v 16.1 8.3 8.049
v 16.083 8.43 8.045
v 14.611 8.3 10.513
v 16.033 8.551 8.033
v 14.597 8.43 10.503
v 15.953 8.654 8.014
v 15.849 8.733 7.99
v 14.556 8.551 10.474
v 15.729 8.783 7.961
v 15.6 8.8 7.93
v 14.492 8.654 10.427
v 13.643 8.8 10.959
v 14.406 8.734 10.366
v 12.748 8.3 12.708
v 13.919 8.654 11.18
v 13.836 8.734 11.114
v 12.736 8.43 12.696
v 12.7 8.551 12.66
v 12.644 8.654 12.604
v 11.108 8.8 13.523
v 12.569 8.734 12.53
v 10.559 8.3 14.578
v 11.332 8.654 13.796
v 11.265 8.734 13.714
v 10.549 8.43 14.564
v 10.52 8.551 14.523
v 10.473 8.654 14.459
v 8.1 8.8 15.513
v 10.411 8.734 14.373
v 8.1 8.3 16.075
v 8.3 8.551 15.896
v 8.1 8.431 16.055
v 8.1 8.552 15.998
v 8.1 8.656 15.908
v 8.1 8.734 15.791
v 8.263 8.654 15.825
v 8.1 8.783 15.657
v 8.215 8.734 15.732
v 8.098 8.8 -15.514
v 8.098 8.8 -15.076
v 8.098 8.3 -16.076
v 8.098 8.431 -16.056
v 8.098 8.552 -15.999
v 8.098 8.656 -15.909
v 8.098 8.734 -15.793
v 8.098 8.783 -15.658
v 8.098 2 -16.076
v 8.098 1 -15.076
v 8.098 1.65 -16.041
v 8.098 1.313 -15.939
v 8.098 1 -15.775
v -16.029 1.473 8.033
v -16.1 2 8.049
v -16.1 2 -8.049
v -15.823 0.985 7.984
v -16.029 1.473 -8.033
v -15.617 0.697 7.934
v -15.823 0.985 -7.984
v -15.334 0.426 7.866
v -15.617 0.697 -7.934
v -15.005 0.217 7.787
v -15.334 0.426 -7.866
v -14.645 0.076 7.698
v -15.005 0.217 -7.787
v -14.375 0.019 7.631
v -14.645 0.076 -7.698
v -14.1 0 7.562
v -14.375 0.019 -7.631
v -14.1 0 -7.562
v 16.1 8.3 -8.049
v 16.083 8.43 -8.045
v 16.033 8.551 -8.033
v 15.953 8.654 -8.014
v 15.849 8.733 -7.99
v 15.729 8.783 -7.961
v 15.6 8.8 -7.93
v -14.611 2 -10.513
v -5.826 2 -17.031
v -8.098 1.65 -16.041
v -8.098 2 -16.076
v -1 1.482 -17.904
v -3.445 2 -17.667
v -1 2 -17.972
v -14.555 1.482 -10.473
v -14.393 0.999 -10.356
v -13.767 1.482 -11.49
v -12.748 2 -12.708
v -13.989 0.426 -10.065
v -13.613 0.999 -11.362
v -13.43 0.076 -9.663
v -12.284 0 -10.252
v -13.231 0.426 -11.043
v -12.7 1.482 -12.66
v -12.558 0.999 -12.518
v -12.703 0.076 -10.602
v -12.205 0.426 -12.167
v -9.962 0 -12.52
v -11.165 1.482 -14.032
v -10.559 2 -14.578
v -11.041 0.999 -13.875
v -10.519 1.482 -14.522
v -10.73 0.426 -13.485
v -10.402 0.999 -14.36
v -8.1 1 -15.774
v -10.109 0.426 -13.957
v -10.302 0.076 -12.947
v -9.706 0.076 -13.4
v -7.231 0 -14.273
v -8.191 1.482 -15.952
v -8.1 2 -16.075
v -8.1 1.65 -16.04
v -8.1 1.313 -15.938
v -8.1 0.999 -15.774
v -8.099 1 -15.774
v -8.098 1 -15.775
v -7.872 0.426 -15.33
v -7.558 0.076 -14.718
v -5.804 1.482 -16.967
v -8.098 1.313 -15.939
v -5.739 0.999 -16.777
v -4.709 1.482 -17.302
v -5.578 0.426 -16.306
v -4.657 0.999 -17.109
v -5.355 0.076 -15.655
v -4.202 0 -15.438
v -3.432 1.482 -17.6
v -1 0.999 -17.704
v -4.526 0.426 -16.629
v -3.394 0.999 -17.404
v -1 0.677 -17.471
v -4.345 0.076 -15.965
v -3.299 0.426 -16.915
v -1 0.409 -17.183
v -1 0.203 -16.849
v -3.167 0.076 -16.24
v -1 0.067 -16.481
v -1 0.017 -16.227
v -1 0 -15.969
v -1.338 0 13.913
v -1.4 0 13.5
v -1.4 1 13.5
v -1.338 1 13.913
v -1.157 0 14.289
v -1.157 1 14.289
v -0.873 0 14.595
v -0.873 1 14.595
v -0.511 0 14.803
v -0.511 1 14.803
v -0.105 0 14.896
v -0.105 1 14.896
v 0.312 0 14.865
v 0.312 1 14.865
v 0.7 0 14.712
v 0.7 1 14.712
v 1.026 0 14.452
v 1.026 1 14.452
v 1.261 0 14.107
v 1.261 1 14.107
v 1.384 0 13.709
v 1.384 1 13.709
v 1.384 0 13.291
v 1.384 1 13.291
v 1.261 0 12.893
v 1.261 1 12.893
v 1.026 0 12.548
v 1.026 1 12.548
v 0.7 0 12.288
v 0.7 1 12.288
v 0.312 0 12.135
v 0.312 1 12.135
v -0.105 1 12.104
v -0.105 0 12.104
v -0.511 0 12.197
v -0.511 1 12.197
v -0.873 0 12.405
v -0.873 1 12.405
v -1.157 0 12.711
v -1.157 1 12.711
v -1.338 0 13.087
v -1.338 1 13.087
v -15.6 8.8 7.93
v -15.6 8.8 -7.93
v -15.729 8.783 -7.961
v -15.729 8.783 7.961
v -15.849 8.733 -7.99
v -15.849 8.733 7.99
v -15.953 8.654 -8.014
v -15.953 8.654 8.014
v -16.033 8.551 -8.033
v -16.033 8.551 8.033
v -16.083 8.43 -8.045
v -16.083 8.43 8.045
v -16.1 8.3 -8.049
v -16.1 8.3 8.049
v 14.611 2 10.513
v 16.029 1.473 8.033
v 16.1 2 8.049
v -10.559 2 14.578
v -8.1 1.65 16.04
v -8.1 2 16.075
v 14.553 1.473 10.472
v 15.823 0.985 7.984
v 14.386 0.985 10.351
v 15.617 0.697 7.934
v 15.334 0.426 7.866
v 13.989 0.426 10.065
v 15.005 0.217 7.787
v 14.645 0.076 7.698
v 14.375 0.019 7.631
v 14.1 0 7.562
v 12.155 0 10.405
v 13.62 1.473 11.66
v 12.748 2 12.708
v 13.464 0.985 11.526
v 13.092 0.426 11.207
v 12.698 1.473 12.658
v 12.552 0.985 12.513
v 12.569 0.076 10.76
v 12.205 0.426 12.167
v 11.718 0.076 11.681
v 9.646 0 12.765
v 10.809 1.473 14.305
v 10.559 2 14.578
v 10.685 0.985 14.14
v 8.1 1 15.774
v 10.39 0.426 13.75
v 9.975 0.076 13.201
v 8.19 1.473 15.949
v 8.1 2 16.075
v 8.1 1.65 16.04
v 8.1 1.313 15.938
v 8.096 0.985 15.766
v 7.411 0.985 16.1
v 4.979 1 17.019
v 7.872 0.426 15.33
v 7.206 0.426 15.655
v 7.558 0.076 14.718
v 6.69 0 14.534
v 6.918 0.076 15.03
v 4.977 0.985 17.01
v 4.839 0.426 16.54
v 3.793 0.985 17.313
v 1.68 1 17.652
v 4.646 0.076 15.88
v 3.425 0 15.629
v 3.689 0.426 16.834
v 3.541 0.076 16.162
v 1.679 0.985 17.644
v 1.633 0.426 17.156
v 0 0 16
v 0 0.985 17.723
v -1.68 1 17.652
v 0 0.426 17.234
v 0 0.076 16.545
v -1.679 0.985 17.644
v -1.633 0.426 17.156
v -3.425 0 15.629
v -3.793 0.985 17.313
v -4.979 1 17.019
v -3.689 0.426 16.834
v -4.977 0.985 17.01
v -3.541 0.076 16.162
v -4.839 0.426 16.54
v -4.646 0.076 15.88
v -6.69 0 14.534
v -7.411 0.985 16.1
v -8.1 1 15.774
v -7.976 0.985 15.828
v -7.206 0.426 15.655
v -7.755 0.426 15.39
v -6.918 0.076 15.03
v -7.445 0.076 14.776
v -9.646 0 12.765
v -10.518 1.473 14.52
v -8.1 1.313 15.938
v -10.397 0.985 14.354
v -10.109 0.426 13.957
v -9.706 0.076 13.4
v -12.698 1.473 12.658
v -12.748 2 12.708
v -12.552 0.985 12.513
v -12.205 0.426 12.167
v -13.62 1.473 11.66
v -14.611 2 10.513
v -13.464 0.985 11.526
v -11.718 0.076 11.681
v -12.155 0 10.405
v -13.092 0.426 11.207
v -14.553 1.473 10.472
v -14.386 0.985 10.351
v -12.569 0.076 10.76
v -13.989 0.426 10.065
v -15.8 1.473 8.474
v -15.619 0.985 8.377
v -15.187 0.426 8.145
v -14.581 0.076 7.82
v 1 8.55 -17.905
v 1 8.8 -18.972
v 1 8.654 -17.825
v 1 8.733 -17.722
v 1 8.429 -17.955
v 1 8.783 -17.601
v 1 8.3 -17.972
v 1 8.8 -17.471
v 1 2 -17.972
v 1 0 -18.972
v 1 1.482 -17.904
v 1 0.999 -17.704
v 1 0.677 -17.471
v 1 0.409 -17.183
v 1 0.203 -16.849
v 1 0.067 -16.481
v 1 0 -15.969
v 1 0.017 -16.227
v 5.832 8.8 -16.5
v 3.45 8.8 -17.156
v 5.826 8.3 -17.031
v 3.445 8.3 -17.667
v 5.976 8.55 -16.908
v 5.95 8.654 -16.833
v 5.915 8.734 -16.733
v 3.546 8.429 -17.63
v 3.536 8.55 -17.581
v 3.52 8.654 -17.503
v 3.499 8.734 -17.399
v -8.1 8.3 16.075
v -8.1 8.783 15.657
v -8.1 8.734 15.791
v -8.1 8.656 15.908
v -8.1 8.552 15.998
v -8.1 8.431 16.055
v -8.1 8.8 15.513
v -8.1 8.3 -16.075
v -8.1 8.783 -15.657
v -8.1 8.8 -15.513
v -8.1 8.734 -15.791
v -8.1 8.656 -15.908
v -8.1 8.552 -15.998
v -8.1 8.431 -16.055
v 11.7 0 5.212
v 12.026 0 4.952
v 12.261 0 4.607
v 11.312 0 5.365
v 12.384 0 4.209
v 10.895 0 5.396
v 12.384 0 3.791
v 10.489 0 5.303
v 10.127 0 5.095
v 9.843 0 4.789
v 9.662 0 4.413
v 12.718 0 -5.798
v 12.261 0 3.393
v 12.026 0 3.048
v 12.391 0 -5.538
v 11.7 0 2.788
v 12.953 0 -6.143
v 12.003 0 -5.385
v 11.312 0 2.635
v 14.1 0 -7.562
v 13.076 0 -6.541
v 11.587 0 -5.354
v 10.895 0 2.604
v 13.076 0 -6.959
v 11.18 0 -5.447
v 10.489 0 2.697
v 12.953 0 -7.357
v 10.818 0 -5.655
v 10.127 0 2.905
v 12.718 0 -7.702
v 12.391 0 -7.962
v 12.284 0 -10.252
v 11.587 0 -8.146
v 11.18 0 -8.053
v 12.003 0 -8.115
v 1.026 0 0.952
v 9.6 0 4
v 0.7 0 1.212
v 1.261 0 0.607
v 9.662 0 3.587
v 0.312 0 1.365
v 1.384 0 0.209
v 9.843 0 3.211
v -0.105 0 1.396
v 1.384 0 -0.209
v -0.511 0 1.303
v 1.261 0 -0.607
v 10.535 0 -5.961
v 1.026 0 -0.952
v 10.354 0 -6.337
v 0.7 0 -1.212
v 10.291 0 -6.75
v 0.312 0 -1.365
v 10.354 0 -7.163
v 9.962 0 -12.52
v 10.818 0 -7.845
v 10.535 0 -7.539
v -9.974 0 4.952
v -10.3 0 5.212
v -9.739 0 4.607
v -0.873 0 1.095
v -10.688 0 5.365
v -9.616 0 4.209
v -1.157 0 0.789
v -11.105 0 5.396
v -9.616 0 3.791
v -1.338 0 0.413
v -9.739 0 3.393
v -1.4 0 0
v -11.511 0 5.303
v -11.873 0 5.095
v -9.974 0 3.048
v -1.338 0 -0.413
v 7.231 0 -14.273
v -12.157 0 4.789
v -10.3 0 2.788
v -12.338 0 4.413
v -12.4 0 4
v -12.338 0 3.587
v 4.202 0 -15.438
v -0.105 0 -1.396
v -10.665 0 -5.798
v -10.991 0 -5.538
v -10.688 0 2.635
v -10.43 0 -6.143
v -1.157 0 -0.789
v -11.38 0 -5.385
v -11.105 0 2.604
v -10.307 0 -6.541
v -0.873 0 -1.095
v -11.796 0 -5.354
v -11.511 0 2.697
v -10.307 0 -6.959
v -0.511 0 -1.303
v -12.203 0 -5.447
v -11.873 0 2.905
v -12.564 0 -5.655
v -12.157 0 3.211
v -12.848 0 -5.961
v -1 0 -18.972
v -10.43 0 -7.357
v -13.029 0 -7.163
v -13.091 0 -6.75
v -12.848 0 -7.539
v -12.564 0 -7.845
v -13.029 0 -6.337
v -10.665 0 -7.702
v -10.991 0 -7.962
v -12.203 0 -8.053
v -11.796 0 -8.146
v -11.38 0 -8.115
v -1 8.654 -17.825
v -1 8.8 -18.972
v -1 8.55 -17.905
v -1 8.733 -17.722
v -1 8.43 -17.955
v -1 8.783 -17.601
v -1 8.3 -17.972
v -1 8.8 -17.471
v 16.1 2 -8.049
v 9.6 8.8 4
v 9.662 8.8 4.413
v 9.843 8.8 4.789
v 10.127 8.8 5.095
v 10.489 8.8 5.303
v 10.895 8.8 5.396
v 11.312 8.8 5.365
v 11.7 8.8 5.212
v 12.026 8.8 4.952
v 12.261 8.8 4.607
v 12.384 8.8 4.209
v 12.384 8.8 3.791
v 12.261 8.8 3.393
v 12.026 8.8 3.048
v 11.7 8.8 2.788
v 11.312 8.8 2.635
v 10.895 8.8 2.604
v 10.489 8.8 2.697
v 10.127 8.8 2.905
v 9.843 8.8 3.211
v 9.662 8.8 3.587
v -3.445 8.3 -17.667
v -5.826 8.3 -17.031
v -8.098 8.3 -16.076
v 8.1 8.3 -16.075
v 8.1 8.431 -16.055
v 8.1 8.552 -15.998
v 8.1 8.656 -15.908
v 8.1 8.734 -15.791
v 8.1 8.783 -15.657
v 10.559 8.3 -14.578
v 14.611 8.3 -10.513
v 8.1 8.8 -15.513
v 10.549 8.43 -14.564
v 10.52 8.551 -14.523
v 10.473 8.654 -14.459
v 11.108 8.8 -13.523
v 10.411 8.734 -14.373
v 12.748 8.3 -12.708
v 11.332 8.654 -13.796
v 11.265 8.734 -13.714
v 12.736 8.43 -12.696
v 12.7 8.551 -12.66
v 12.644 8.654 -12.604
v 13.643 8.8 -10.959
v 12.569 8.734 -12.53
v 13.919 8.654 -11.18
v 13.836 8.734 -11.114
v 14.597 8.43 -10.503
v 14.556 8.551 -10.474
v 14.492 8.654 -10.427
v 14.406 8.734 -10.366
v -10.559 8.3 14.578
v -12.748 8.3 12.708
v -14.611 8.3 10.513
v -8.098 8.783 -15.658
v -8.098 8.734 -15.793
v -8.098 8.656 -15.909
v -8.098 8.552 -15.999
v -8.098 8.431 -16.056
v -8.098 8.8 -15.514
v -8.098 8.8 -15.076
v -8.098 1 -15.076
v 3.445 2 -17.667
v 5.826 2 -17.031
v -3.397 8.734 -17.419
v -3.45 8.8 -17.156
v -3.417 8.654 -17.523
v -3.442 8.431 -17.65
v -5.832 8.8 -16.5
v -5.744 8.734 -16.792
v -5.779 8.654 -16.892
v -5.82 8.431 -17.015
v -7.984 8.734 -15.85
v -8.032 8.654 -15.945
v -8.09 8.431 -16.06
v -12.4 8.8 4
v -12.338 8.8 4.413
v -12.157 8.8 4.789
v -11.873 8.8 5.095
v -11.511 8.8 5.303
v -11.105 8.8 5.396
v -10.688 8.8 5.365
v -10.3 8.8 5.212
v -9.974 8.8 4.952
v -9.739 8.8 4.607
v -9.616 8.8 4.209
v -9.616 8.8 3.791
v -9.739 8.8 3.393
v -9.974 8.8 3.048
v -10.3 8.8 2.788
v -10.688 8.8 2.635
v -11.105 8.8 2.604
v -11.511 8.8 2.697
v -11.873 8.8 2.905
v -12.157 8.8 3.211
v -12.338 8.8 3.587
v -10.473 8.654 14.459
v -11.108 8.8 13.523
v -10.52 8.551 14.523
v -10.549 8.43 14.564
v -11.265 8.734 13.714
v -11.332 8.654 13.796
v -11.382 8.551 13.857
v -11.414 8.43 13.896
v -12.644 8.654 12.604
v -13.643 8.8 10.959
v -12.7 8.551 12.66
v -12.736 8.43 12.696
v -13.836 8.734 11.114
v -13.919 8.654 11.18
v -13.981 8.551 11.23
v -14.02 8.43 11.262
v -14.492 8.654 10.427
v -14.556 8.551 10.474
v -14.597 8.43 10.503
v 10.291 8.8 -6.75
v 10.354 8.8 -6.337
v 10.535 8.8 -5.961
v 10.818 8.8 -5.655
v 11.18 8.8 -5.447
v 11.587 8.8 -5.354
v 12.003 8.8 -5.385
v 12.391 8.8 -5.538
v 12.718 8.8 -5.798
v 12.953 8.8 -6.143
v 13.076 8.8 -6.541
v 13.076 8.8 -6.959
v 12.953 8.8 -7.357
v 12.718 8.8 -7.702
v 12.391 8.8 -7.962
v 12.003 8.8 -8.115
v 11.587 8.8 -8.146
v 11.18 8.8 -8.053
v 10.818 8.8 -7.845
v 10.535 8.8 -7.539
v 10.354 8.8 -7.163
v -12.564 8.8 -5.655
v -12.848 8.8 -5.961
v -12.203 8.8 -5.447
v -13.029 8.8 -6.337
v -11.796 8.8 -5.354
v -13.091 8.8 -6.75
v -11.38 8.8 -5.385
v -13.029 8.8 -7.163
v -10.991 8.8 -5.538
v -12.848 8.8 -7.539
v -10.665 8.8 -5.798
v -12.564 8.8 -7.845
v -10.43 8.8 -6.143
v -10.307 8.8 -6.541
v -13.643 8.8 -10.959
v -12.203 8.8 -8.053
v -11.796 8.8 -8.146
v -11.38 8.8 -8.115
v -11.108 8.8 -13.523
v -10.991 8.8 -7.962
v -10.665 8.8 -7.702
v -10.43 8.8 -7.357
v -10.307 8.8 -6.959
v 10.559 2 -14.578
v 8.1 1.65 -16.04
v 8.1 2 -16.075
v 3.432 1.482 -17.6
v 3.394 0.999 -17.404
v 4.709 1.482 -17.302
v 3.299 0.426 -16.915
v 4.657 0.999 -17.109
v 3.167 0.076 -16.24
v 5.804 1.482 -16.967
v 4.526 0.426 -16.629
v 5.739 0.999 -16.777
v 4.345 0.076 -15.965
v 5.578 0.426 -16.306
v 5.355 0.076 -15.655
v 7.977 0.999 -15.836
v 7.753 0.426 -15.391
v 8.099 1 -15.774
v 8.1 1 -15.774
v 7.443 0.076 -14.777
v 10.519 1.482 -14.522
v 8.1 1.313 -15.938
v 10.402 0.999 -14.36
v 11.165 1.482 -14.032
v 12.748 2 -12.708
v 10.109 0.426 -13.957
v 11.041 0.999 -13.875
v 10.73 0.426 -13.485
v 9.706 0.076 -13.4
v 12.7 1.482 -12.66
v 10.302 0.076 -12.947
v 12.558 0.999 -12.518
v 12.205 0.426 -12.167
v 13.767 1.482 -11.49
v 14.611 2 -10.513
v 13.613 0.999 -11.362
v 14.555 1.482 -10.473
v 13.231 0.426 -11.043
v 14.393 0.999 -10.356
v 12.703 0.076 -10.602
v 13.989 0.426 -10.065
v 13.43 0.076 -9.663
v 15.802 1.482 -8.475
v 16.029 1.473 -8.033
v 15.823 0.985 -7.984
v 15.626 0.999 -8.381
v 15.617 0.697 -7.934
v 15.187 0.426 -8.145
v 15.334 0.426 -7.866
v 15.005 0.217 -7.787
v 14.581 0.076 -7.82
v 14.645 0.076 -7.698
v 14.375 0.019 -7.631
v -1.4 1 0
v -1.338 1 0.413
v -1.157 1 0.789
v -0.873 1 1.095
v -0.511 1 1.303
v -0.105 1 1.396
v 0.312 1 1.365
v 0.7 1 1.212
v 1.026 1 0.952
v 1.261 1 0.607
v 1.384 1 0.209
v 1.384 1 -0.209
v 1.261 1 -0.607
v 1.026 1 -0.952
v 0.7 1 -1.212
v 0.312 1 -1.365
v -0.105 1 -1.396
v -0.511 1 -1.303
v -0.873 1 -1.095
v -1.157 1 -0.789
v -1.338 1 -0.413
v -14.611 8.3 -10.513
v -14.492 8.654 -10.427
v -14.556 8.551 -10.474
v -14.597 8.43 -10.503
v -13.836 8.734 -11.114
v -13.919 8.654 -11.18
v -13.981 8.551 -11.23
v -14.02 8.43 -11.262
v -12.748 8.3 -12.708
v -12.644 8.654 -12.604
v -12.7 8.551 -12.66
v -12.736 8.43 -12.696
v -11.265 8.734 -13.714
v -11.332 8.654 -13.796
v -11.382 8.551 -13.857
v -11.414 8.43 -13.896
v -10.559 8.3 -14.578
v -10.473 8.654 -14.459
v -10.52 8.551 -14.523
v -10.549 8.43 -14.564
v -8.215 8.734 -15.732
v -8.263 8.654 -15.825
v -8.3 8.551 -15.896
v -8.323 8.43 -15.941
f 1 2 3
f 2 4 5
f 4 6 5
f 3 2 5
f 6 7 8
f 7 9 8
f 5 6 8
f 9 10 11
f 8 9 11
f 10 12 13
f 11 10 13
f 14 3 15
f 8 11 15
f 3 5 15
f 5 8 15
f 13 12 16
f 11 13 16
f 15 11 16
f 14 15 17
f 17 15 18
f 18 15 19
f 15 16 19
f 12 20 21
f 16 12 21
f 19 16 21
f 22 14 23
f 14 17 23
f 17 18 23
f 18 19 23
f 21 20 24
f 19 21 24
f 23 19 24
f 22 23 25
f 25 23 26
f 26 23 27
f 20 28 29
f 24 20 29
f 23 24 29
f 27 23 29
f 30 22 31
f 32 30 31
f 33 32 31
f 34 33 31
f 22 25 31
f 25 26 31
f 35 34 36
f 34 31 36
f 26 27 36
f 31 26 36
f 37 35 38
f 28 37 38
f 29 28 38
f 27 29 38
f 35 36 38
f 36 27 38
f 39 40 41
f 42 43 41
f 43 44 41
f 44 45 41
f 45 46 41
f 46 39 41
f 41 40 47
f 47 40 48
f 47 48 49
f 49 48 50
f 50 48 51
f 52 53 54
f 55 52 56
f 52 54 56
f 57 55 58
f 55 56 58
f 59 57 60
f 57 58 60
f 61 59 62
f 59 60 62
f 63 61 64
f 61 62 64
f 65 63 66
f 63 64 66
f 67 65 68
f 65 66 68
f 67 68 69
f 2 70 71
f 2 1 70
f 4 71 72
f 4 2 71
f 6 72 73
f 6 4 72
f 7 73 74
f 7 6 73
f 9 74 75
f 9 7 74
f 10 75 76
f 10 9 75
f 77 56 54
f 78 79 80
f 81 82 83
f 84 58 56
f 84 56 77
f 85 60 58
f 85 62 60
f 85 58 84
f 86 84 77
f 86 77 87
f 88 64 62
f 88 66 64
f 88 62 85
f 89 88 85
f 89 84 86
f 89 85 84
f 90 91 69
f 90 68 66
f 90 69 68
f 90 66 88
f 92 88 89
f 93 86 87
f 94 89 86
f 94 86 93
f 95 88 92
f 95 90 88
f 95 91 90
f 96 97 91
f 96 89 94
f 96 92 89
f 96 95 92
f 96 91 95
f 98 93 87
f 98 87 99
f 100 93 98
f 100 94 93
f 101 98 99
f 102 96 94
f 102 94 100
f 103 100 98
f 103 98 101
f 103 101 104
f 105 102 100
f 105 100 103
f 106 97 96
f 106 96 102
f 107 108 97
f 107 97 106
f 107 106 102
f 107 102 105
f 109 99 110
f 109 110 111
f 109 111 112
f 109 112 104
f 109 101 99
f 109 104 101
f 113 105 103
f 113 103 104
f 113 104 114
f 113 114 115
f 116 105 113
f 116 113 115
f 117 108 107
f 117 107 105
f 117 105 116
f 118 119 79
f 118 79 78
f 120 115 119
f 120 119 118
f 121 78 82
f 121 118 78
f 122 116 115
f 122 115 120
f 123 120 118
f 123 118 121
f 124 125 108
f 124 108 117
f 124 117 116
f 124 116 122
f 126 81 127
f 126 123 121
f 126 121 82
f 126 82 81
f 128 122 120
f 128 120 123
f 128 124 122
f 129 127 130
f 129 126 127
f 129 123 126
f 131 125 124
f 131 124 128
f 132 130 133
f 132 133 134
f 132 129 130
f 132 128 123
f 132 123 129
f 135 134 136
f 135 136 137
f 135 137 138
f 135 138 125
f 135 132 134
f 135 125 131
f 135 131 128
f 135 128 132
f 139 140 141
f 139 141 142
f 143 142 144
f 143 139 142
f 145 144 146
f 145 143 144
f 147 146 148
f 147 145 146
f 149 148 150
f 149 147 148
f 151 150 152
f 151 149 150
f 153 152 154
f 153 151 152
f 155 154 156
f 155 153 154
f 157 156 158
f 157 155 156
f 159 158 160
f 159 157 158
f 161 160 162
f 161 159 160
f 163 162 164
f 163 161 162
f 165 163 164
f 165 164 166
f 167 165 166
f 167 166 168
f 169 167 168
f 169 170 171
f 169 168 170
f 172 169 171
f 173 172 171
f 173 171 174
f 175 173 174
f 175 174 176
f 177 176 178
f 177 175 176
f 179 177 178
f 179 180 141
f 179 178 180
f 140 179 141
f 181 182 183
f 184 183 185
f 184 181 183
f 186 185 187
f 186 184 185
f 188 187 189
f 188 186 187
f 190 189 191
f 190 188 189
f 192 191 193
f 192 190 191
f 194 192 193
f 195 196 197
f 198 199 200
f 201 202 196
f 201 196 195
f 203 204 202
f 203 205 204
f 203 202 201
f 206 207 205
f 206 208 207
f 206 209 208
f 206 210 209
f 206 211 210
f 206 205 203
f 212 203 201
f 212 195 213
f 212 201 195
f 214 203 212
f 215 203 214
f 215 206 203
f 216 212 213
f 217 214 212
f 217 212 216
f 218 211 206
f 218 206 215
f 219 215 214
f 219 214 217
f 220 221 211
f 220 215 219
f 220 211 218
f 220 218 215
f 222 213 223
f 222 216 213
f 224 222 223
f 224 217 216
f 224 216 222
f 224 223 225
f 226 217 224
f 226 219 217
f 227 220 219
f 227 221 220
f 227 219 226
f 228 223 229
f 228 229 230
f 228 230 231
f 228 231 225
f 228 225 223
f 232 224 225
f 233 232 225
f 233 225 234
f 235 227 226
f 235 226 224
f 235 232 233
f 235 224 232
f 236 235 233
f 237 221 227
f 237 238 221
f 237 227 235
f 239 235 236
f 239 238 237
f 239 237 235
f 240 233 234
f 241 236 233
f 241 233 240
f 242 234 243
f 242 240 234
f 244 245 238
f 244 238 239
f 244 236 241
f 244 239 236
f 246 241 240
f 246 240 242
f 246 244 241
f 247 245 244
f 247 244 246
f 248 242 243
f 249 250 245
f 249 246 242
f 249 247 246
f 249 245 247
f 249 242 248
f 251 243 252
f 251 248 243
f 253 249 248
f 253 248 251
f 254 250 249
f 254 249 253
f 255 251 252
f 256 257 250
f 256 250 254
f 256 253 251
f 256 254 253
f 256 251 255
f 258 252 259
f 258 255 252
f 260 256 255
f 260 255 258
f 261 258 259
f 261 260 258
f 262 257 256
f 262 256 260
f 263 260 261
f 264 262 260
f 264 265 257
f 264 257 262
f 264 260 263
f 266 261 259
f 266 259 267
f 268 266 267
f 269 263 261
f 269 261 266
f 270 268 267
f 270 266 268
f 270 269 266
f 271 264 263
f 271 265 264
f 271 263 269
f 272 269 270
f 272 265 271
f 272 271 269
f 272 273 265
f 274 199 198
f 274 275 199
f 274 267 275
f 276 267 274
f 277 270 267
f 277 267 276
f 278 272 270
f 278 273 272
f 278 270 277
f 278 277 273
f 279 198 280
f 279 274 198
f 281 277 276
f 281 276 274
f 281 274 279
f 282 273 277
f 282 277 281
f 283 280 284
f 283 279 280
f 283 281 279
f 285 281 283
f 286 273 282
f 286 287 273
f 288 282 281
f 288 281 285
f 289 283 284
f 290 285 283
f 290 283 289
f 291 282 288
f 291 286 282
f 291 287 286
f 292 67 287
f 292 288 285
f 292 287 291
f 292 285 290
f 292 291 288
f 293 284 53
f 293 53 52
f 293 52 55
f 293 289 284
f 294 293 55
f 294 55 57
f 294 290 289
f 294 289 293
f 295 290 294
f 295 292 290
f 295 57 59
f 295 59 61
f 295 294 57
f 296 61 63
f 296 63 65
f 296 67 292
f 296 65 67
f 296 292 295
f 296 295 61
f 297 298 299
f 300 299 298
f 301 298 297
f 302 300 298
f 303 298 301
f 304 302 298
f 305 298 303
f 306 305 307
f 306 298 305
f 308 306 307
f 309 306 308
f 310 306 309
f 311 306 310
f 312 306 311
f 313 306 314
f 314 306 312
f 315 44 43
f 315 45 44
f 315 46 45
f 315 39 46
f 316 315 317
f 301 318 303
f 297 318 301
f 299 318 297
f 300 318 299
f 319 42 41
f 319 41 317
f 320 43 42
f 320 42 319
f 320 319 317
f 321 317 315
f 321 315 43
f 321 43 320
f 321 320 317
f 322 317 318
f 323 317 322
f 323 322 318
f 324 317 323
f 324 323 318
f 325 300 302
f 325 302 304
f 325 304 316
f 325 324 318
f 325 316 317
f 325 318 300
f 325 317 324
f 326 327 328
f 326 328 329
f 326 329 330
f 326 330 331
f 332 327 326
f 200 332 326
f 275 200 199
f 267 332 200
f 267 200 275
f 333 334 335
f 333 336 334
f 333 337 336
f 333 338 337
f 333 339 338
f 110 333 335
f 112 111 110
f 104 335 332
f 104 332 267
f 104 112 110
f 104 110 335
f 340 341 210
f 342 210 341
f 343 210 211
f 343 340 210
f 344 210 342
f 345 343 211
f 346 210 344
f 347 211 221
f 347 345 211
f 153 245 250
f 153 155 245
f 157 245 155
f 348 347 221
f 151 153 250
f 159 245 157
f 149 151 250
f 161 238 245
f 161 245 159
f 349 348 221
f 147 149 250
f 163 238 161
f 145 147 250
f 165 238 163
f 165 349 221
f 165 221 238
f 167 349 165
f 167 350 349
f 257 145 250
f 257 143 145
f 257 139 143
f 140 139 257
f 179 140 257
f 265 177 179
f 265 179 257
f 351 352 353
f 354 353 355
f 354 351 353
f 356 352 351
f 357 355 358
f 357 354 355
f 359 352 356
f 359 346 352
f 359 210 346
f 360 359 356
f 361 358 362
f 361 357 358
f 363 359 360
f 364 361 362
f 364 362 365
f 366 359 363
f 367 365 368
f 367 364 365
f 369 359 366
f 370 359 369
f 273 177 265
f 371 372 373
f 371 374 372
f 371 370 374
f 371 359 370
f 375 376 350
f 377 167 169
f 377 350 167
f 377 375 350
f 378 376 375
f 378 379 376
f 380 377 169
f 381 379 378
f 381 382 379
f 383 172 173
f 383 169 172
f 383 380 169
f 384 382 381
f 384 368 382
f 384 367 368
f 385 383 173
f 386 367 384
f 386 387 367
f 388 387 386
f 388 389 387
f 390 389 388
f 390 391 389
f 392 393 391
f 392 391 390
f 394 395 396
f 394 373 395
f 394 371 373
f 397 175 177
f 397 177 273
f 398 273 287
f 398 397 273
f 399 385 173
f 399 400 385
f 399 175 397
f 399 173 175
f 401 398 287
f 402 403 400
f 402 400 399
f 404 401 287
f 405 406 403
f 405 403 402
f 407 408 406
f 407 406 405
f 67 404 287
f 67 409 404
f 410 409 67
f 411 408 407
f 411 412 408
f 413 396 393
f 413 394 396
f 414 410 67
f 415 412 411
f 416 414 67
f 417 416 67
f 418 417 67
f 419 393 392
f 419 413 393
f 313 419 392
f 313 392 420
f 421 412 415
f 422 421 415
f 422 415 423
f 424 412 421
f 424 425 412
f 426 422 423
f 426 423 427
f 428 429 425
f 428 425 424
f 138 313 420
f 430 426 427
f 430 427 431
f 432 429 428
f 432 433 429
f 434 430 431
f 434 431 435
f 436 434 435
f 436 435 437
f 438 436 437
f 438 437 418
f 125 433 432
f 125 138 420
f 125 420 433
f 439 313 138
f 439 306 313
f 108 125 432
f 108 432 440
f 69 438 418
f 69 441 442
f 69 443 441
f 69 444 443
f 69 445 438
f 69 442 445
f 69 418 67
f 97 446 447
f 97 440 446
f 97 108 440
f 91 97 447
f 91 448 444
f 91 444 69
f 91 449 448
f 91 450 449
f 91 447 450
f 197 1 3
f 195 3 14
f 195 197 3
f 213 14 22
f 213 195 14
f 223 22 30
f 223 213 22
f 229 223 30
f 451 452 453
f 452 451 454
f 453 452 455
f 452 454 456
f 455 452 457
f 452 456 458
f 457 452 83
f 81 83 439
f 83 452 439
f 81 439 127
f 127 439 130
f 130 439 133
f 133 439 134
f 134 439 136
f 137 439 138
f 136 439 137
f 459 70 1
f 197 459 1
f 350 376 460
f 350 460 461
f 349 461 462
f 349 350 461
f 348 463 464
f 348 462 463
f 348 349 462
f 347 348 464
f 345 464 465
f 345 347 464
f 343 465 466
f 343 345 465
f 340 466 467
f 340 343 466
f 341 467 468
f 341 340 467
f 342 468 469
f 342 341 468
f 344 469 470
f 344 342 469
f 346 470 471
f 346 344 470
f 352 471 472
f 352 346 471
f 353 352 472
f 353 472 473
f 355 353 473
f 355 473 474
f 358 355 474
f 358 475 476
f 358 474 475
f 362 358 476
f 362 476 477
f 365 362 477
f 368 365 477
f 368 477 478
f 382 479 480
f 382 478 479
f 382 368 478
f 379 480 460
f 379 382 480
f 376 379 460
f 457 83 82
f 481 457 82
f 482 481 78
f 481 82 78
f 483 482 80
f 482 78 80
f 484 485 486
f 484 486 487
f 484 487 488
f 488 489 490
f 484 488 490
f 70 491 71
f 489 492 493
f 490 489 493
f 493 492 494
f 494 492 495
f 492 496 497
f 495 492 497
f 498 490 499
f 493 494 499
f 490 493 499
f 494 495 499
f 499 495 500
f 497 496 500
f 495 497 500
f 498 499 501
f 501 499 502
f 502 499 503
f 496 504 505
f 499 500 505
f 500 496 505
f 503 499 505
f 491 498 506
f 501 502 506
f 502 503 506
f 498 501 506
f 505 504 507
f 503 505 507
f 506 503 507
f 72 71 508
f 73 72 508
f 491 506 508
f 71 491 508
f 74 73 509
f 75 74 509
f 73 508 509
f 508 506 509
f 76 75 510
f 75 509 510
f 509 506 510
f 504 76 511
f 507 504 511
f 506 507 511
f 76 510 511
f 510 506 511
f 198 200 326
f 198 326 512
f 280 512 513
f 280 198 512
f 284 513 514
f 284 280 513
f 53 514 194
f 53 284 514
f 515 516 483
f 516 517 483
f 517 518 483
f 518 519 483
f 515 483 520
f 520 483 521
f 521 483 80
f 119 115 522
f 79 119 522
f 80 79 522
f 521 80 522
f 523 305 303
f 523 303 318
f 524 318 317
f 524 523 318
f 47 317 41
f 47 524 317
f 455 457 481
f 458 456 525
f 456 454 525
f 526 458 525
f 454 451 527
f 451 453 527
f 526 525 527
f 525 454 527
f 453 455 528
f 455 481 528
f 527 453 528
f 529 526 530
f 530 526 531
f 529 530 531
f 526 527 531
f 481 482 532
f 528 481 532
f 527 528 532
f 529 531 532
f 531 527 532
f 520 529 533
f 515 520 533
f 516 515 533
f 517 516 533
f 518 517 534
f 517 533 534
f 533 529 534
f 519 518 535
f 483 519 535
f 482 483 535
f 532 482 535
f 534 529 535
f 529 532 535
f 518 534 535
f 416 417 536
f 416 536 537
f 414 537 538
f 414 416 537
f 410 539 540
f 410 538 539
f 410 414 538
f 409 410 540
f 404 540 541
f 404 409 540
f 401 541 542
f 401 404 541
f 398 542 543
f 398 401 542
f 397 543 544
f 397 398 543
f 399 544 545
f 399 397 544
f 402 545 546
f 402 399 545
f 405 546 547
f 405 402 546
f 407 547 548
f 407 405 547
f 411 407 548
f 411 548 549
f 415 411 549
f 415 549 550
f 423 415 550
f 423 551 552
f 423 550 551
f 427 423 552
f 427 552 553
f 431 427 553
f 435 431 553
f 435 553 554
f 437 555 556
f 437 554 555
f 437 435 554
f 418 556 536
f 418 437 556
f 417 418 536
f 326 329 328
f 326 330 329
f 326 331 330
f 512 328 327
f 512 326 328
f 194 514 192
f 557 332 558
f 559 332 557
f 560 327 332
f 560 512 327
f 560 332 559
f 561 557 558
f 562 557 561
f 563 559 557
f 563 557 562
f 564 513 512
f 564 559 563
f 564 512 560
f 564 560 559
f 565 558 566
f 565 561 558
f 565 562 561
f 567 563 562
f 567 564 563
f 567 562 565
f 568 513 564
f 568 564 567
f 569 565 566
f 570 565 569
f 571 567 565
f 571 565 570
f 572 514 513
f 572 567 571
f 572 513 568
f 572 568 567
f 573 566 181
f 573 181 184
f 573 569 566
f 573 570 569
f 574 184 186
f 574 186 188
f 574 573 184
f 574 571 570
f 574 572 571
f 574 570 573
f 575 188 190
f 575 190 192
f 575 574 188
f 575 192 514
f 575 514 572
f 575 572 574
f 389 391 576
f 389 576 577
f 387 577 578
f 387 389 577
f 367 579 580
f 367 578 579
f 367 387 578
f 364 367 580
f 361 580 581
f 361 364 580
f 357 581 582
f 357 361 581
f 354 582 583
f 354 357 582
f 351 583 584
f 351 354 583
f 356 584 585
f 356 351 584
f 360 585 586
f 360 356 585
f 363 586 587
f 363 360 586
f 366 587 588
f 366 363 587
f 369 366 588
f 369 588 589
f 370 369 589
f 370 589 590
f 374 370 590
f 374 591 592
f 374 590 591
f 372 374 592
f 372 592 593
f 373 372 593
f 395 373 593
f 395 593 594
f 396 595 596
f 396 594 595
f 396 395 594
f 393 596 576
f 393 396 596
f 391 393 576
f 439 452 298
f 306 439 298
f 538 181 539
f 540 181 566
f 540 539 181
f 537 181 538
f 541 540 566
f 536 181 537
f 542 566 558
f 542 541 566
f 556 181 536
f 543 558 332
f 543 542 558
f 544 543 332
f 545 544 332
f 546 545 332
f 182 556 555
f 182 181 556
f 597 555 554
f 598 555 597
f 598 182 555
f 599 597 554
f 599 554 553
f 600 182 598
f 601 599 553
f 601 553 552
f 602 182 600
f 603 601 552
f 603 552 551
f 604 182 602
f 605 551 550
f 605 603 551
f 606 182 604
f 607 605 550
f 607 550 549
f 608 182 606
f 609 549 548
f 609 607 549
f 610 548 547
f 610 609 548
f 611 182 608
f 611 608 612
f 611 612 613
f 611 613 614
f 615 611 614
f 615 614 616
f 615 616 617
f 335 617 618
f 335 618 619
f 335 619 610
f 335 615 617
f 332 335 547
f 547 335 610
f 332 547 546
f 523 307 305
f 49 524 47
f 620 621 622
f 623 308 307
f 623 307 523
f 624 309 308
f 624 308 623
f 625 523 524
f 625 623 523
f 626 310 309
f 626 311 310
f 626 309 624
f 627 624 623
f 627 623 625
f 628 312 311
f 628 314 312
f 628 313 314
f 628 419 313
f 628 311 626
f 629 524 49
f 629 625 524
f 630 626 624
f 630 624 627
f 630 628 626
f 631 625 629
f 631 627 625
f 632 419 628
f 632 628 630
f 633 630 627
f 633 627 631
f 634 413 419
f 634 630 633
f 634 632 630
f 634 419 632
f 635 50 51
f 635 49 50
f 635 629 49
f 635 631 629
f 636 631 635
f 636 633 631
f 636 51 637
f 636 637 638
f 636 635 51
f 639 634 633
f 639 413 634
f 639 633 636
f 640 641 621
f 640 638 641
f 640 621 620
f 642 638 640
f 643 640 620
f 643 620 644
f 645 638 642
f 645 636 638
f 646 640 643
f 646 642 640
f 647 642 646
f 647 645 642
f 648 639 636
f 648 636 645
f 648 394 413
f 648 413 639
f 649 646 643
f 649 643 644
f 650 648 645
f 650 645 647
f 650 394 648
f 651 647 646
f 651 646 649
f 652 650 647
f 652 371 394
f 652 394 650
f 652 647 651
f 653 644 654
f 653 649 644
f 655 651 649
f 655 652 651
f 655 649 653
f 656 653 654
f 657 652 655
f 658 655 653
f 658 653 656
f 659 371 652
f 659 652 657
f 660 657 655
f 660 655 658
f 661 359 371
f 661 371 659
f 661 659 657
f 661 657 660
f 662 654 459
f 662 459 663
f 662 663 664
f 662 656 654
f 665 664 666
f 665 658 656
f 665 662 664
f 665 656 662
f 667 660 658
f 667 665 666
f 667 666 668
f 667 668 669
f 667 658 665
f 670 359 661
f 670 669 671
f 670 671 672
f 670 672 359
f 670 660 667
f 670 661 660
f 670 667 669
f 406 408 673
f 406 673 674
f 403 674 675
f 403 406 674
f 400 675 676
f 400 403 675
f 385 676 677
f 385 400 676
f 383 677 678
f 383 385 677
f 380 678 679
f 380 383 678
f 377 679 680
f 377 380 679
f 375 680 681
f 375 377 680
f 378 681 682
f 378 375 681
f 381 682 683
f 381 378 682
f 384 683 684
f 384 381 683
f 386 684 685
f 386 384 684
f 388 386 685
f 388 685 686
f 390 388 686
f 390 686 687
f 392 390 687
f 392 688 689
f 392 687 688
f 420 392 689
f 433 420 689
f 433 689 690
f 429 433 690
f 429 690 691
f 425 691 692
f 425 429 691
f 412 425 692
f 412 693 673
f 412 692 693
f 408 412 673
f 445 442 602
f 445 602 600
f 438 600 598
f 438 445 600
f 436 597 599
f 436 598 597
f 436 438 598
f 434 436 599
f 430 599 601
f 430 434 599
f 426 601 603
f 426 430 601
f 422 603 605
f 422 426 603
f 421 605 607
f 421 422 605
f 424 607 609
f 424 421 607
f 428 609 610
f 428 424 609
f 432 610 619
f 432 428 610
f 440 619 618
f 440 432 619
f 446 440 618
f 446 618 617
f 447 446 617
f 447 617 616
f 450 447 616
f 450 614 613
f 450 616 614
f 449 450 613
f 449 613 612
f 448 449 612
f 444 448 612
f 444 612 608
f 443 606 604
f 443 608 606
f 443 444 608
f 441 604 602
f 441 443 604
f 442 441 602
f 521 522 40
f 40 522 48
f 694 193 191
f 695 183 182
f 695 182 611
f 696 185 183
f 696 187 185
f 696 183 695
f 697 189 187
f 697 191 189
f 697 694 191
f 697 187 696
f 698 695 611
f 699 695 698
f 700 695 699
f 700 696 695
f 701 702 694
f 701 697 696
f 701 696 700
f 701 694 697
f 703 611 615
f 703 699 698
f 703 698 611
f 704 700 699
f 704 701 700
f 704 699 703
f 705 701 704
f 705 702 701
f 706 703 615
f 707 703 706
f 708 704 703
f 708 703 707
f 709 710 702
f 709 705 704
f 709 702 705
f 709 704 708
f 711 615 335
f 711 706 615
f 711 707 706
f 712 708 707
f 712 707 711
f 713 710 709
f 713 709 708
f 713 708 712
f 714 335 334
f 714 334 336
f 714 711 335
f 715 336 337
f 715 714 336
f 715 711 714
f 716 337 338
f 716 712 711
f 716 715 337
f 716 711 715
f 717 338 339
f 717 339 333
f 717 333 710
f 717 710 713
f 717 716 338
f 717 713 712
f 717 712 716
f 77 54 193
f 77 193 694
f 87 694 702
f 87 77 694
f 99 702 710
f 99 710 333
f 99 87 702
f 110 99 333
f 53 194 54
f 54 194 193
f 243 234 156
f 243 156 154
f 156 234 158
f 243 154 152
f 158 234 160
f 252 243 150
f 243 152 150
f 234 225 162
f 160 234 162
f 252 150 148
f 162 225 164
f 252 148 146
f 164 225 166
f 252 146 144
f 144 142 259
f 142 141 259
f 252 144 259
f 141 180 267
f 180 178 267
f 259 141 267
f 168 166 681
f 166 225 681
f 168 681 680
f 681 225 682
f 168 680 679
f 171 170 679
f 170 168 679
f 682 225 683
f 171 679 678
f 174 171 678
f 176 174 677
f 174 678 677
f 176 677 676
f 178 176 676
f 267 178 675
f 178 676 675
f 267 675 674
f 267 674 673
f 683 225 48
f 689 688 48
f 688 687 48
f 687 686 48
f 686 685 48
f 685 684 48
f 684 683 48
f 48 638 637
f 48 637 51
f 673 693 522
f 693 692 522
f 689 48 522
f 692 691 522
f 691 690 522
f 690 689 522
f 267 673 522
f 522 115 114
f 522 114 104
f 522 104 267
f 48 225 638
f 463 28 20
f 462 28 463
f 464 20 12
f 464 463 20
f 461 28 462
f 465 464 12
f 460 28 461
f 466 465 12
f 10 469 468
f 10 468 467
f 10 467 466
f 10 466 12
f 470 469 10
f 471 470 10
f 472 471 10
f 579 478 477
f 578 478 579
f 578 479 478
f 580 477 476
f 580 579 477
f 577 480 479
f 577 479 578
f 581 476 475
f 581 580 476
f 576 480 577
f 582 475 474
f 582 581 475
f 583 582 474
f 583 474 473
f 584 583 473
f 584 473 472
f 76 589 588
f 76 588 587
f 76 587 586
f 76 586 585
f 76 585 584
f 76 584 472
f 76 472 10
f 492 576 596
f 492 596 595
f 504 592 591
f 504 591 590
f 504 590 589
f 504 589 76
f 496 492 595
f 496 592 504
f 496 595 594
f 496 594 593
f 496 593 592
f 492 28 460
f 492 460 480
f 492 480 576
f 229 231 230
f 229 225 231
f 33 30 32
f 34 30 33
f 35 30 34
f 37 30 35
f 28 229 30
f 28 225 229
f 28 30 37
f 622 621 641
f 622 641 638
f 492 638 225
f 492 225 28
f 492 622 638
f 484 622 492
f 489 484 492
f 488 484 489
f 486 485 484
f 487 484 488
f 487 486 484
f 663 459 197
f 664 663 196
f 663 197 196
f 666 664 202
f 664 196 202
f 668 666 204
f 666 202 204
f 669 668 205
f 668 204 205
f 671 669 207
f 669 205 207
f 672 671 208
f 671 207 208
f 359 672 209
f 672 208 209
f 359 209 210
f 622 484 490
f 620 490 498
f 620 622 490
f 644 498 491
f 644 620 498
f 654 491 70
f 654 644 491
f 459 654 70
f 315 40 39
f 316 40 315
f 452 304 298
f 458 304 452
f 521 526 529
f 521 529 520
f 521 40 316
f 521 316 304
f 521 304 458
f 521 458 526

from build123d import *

# Parameters (mm, degrees)
BOSS_EXTRUDE1_DEPTH      = 1
BOSS_EXTRUDE2_DEPTH      = 18
BOSS_EXTRUDE2_DEPTH_BACK = 18.972201
SKETCH3_R                = 59.910539196270584
CUT_EXTRUDE1_DEPTH       = 28.593195008632154
CUT_EXTRUDE2_DEPTH       = 28.59319484059837
CUT_EXTRUDE2_DEPTH_BACK  = 28.59319484059837
SKETCH5_R                = 1.4
SKETCH5_R_2              = 1.3999999999999992
SKETCH5_R_3              = 1.400000000000003
SKETCH5_R_4              = 1.3999999999999988
SKETCH5_R_5              = 1.399999999999999
BOSS_EXTRUDE3_DEPTH      = 8.8
CUT_EXTRUDE3_DEPTH       = 28.290738383400775
FILLET1_R                = 2
FILLET2_R                = 0.5


with BuildPart() as part:
    # Sketch1 → Boss-Extrude1 (new body)
    with BuildSketch(Plane(origin=(0, 0, 0), x_dir=(1, 0, 0), z_dir=(0, 1, 0))):
        with BuildLine():
            Line((-1.0000000000000024, 17.97220075561143), (-1.0000000000000024, 18.97220075561143))
            Line((-1.0000000000000024, 18.97220075561143), (0.9999999999999977, 18.97220075561143))
            Line((0.9999999999999977, 18.97220075561143), (0.9999999999999981, 17.97220075561143))
            ThreePointArc((0.9999999999999981, 17.97220075561143), (-3.31e-15, -18), (-1.0000000000000024, 17.97220075561143))
        make_face()
    extrude(amount=BOSS_EXTRUDE1_DEPTH)

    # Sketch2 → Boss-Extrude2 (add, two sides: drawn at the far end of the back side and taken through both)
    with BuildSketch(Plane.XY.offset(-BOSS_EXTRUDE2_DEPTH_BACK)):
        Polygon((-16.1, 8.799999999999999), (-8.100000000000005, 8.799999999999999), (-8.099999999999996, 1), (-16.099999999999998, 1), align=None)
        Polygon((8.099999999999994, 8.799999999999999), (16.099999999999994, 8.799999999999999), (16.100000000000005, 1), (8.100000000000003, 0.9999999999999991), align=None)
    extrude(amount=BOSS_EXTRUDE2_DEPTH + BOSS_EXTRUDE2_DEPTH_BACK)

    # Sketch3 → Cut-Extrude1 (cut, through all)
    with BuildSketch(Plane.XZ):
        Circle(SKETCH3_R)
        with BuildLine():
            Line((-1.000000000000015, -17.97220075561143), (-1.0000000000000024, -18.97220075561143))
            Line((-1.0000000000000024, -18.97220075561143), (0.9999999999999977, -18.97220075561143))
            Line((0.9999999999999977, -18.97220075561143), (0.9999999999999927, -17.972200755611432))
            ThreePointArc((0.9999999999999927, -17.972200755611432), (1.309e-14, 18.000000000000004), (-1.000000000000015, -17.97220075561143))
        make_face(mode=Mode.SUBTRACT)
    extrude(amount=-CUT_EXTRUDE1_DEPTH, mode=Mode.SUBTRACT)

    # Sketch5 → Cut-Extrude2 (cut, two sides: drawn at the far end of the back side and taken through both)
    with BuildSketch(Plane(origin=(0, 0, 0), x_dir=(1, 0, 0), z_dir=(0, 1, 0)).offset(-CUT_EXTRUDE2_DEPTH_BACK)):
        with Locations(Location((0, 0, 0), (0, 0, 180))):
            Circle(SKETCH5_R)
        with Locations(Location((11, -4, 0), (0, 0, 180))):
            Circle(SKETCH5_R_2)
        with Locations(Location((-11, -4, 0), (0, 0, 180))):
            Circle(SKETCH5_R_2)
        with Locations(Location((-11.69134295108996, 6.749999999999895, 0), (0, 0, 180))):
            Circle(SKETCH5_R_3)
        with Locations(Location((1.197e-13, -13.499999999999998, 0), (0, 0, 180))):
            Circle(SKETCH5_R_4)
        with Locations(Location((11.691342951089881, 6.750000000000103, 0), (0, 0, 180))):
            Circle(SKETCH5_R_5)
    extrude(amount=CUT_EXTRUDE2_DEPTH + CUT_EXTRUDE2_DEPTH_BACK, mode=Mode.SUBTRACT)

    # Sketch6 → Boss-Extrude3 (add)
    with BuildSketch(Plane.XZ):
        with BuildLine():
            Line((-8.097530487747482, -15.075758146973973), (8.097530487747482, -15.075758146973973))
            Line((8.097530487747482, -15.075758146973973), (8.09753048774748, -16.075758146973975))
            ThreePointArc((8.09753048774748, -16.075758146973975), (4.646545909149893, -17.38992843901787), (0.9999999999999927, -17.972200755611432))
            Line((0.9999999999999927, -17.972200755611432), (0.9999999999999977, -18.97220075561143))
            Line((0.9999999999999977, -18.97220075561143), (-1.0000000000000024, -18.97220075561143))
            Line((-1.0000000000000024, -18.97220075561143), (-1.000000000000015, -17.97220075561143))
            ThreePointArc((-1.000000000000015, -17.97220075561143), (-4.646545909149902, -17.38992843901787), (-8.097530487747482, -16.075758146973975))
            Line((-8.097530487747482, -16.075758146973975), (-8.097530487747482, -15.075758146973973))
        make_face()
    extrude(amount=-BOSS_EXTRUDE3_DEPTH)

    # Sketch7 → Cut-Extrude3 (cut, through all)
    with BuildSketch(Plane(origin=(0, 1, 0), x_dir=(1, 0, 0), z_dir=(0, 1, 0))):
        with BuildLine():
            Line((16.099999999999994, 8.049223565040313), (16.099999999999994, -8.049223565040313))
            ThreePointArc((16.099999999999994, -8.049223565040313), (18.000000000000004, 0), (16.099999999999994, 8.049223565040313))
        make_face()
        with BuildLine():
            Line((-16.099999999999998, -8.049223565040306), (-16.099999999999998, 8.049223565040306))
            ThreePointArc((-16.099999999999998, 8.049223565040306), (-18.000000000000004, 2.2e-15), (-16.099999999999998, -8.049223565040306))
        make_face()
    extrude(amount=-CUT_EXTRUDE3_DEPTH, mode=Mode.SUBTRACT)

    # Fillet1
    # the kernel refuses this fillet: 2 mm, written as the material it takes off along each edge
    with BuildSketch(Plane(origin=(-3.872e-14, 0, -5.4e-16), x_dir=(0.9828239646934485, 0, 0.1845455348260998), z_dir=(0.1845455348260998, 0, -0.9828239646934485))) as fillet1_piece_1:
        with BuildLine():
            CenterArc((17.999999999999872 - FILLET1_R, -FILLET1_R), FILLET1_R, 6.36e-15, 90)
            Line((17.999999999999872, -FILLET1_R), (17.999999999999872, 0))
            Line((17.999999999999872, 0), (17.999999999999872 - FILLET1_R, 0))
        make_face()
    revolve(axis=Axis((-3.872e-14, 0, -5.4e-16), (0, -1, 0)), revolution_arc=158.7307255035683, mode=Mode.SUBTRACT)
    with BuildSketch(Plane(origin=(-3.872e-14, 0, -5.4e-16), x_dir=(0.4498628048748618, 0, -0.8930976748318865), z_dir=(-0.8930976748318865, 0, -0.4498628048748618))) as fillet1_piece_2:
        with BuildLine():
            CenterArc((18.000000000000004 - FILLET1_R, -FILLET1_R), FILLET1_R, 6.36e-15, 90)
            Line((18.000000000000007, -FILLET1_R), (18.000000000000004, 0))
            Line((18.000000000000004, 0), (18.000000000000004 - FILLET1_R, 0))
        make_face()
    revolve(axis=Axis((-3.872e-14, 0, -5.4e-16), (0, -1, 0)), revolution_arc=52.61883467829079, mode=Mode.SUBTRACT)
    with BuildSketch(Plane(origin=(16.099999999999994, 0, 13.049223565040313), x_dir=(-1, 0, 0), z_dir=(0, 0, -1))) as fillet1_piece_3:
        with BuildLine():
            CenterArc((FILLET1_R, FILLET1_R), FILLET1_R, 180, 90)
            Line((0, FILLET1_R), (0, 0))
            Line((0, 0), (FILLET1_R, 0))
        make_face()
    extrude(amount=26.098447130080626, mode=Mode.SUBTRACT)
    with BuildSketch(Plane(origin=(-16.099999999999998, 0, -13.049223565040311), x_dir=(1, 0, 0), z_dir=(0, 0, 1))) as fillet1_piece_4:
        with BuildLine():
            CenterArc((FILLET1_R, FILLET1_R), FILLET1_R, 180, 90)
            Line((0, FILLET1_R), (0, 0))
            Line((0, 0), (FILLET1_R, 0))
        make_face()
    extrude(amount=26.098447130080615, mode=Mode.SUBTRACT)
    with BuildSketch(Plane(origin=(-3.872e-14, 0, -5.4e-16), x_dir=(-0.9827864332200049, 0, -0.18474530218303542), z_dir=(-0.18474530218303542, 0, 0.9827864332200049))) as fillet1_piece_5:
        with BuildLine():
            CenterArc((18.000000000000007 - FILLET1_R, -FILLET1_R), FILLET1_R, 0, 90)
            Line((18.000000000000007 - FILLET1_R, 2.2e-16), (18.000000000000007, 0))
            Line((18.000000000000007, 0), (18.000000000000007, -FILLET1_R))
        make_face()
    revolve(axis=Axis((-3.872e-14, 0, -5.4e-16), (0, -1, 0)), revolution_arc=52.61883467829094, mode=Mode.SUBTRACT)
    with BuildSketch(Plane(origin=(-3.872e-14, 0, -5.4e-16), x_dir=(-0.44986280487485913, 0, -0.8930976748318878), z_dir=(-0.8930976748318878, 0, 0.44986280487485913))) as fillet1_piece_6_section:
        with BuildLine():
            CenterArc((18 - FILLET1_R, -FILLET1_R), FILLET1_R, 0, 89.9999999999999)
            Line((18 - FILLET1_R, 2.2e-16), (18, 0))
            Line((18, 0), (18, -FILLET1_R))
        make_face()
    fillet1_piece_6 = revolve(axis=Axis((-3.872e-14, 0, -5.4e-16), (0, -1, 0)), revolution_arc=39.46607540970417, mode=Mode.PRIVATE)
    fillet1_piece_6 = split(fillet1_piece_6, bisect_by=Plane(origin=(-1.0000000000000024, 0.45992141450225776, -16.842636156243355), z_dir=(-1, 0, 0)), keep=Keep.TOP, mode=Mode.PRIVATE)
    add(fillet1_piece_6, mode=Mode.SUBTRACT)
    with BuildSketch(Plane(origin=(-3.872e-14, 0, -5.4e-16), x_dir=(-0.44986280487485913, 0, -0.8930976748318878), z_dir=(-0.8930976748318878, 0, 0.44986280487485913))) as fillet1_piece_7_section:
        with BuildLine():
            CenterArc((18 - FILLET1_R, -FILLET1_R), FILLET1_R, 0, 89.9999999999999)
            Line((18 - FILLET1_R, 2.2e-16), (18, 0))
            Line((18, 0), (18, -FILLET1_R))
        make_face()
    fillet1_piece_7 = revolve(axis=Axis((-3.872e-14, 0, -5.4e-16), (0, -1, 0)), revolution_arc=39.46607540970417, mode=Mode.PRIVATE)
    fillet1_piece_7 = split(fillet1_piece_7, bisect_by=Plane(origin=(0.9999999999999897, 0.4612121351403519, -17.37087292856804), z_dir=(1, 0, 5e-15)), keep=Keep.TOP, mode=Mode.PRIVATE)
    add(fillet1_piece_7, mode=Mode.SUBTRACT)
    with BuildSketch(Plane(origin=(-3.872e-14, 0, -5.4e-16), x_dir=(-0.22037727986092012, 0, -0.9754147089936167), z_dir=(-0.9754147089936167, 0, 0.22037727986092012))) as fillet1_piece_8_section:
        with BuildLine():
            CenterArc((18.000000000000014 - FILLET1_R, -FILLET1_R), FILLET1_R, 1.272e-14, 90)
            Line((18.000000000000014, -FILLET1_R), (18.000000000000014, 0))
            Line((18.000000000000014, 0), (18.000000000000014 - FILLET1_R, 0))
        make_face()
    fillet1_piece_8 = revolve(axis=Axis((-3.872e-14, 0, -5.4e-16), (0, -1, 0)), revolution_arc=39.46607540970416, mode=Mode.PRIVATE)
    fillet1_piece_8 = split(fillet1_piece_8, bisect_by=Plane(origin=(-1.0000000000000024, 0.4612120759147971, -17.37087269742329), z_dir=(-1, 0, 0)), keep=Keep.TOP, mode=Mode.PRIVATE)
    add(fillet1_piece_8, mode=Mode.SUBTRACT)
    with BuildSketch(Plane(origin=(-3.872e-14, 0, -5.4e-16), x_dir=(-0.22037727986092012, 0, -0.9754147089936167), z_dir=(-0.9754147089936167, 0, 0.22037727986092012))) as fillet1_piece_9_section:
        with BuildLine():
            CenterArc((18.000000000000014 - FILLET1_R, -FILLET1_R), FILLET1_R, 1.272e-14, 90)
            Line((18.000000000000014, -FILLET1_R), (18.000000000000014, 0))
            Line((18.000000000000014, 0), (18.000000000000014 - FILLET1_R, 0))
        make_face()
    fillet1_piece_9 = revolve(axis=Axis((-3.872e-14, 0, -5.4e-16), (0, -1, 0)), revolution_arc=39.46607540970416, mode=Mode.PRIVATE)
    fillet1_piece_9 = split(fillet1_piece_9, bisect_by=Plane(origin=(0.999999999999987, 0.4599214469726478, -16.84263631620444), z_dir=(1, 0, 5e-15)), keep=Keep.TOP, mode=Mode.PRIVATE)
    add(fillet1_piece_9, mode=Mode.SUBTRACT)

    # Fillet2
    fillet2_edges = [part.edges().sort_by_distance(p)[0] for p in [
        (4.646545909149891, 8.8, -17.38992843901787),
        (-4.646545909149905, 8.8, -17.389928439017865),
        (16.099999999999994, 8.799999999999999, 0),
        (-16.1, 8.799999999999999, 0),
        (-12.747992845911156, 8.799999999999999, 12.70781957696123),
        (-12.747992845911165, 8.799999999999999, -12.707819576961219),
        (12.747992845911162, 8.799999999999999, 12.707819576961153),
        (12.74799284591116, 8.799999999999999, -12.707819576961155),
    ]]
    fillet(fillet2_edges, radius=FILLET2_R)


solid = part.part
